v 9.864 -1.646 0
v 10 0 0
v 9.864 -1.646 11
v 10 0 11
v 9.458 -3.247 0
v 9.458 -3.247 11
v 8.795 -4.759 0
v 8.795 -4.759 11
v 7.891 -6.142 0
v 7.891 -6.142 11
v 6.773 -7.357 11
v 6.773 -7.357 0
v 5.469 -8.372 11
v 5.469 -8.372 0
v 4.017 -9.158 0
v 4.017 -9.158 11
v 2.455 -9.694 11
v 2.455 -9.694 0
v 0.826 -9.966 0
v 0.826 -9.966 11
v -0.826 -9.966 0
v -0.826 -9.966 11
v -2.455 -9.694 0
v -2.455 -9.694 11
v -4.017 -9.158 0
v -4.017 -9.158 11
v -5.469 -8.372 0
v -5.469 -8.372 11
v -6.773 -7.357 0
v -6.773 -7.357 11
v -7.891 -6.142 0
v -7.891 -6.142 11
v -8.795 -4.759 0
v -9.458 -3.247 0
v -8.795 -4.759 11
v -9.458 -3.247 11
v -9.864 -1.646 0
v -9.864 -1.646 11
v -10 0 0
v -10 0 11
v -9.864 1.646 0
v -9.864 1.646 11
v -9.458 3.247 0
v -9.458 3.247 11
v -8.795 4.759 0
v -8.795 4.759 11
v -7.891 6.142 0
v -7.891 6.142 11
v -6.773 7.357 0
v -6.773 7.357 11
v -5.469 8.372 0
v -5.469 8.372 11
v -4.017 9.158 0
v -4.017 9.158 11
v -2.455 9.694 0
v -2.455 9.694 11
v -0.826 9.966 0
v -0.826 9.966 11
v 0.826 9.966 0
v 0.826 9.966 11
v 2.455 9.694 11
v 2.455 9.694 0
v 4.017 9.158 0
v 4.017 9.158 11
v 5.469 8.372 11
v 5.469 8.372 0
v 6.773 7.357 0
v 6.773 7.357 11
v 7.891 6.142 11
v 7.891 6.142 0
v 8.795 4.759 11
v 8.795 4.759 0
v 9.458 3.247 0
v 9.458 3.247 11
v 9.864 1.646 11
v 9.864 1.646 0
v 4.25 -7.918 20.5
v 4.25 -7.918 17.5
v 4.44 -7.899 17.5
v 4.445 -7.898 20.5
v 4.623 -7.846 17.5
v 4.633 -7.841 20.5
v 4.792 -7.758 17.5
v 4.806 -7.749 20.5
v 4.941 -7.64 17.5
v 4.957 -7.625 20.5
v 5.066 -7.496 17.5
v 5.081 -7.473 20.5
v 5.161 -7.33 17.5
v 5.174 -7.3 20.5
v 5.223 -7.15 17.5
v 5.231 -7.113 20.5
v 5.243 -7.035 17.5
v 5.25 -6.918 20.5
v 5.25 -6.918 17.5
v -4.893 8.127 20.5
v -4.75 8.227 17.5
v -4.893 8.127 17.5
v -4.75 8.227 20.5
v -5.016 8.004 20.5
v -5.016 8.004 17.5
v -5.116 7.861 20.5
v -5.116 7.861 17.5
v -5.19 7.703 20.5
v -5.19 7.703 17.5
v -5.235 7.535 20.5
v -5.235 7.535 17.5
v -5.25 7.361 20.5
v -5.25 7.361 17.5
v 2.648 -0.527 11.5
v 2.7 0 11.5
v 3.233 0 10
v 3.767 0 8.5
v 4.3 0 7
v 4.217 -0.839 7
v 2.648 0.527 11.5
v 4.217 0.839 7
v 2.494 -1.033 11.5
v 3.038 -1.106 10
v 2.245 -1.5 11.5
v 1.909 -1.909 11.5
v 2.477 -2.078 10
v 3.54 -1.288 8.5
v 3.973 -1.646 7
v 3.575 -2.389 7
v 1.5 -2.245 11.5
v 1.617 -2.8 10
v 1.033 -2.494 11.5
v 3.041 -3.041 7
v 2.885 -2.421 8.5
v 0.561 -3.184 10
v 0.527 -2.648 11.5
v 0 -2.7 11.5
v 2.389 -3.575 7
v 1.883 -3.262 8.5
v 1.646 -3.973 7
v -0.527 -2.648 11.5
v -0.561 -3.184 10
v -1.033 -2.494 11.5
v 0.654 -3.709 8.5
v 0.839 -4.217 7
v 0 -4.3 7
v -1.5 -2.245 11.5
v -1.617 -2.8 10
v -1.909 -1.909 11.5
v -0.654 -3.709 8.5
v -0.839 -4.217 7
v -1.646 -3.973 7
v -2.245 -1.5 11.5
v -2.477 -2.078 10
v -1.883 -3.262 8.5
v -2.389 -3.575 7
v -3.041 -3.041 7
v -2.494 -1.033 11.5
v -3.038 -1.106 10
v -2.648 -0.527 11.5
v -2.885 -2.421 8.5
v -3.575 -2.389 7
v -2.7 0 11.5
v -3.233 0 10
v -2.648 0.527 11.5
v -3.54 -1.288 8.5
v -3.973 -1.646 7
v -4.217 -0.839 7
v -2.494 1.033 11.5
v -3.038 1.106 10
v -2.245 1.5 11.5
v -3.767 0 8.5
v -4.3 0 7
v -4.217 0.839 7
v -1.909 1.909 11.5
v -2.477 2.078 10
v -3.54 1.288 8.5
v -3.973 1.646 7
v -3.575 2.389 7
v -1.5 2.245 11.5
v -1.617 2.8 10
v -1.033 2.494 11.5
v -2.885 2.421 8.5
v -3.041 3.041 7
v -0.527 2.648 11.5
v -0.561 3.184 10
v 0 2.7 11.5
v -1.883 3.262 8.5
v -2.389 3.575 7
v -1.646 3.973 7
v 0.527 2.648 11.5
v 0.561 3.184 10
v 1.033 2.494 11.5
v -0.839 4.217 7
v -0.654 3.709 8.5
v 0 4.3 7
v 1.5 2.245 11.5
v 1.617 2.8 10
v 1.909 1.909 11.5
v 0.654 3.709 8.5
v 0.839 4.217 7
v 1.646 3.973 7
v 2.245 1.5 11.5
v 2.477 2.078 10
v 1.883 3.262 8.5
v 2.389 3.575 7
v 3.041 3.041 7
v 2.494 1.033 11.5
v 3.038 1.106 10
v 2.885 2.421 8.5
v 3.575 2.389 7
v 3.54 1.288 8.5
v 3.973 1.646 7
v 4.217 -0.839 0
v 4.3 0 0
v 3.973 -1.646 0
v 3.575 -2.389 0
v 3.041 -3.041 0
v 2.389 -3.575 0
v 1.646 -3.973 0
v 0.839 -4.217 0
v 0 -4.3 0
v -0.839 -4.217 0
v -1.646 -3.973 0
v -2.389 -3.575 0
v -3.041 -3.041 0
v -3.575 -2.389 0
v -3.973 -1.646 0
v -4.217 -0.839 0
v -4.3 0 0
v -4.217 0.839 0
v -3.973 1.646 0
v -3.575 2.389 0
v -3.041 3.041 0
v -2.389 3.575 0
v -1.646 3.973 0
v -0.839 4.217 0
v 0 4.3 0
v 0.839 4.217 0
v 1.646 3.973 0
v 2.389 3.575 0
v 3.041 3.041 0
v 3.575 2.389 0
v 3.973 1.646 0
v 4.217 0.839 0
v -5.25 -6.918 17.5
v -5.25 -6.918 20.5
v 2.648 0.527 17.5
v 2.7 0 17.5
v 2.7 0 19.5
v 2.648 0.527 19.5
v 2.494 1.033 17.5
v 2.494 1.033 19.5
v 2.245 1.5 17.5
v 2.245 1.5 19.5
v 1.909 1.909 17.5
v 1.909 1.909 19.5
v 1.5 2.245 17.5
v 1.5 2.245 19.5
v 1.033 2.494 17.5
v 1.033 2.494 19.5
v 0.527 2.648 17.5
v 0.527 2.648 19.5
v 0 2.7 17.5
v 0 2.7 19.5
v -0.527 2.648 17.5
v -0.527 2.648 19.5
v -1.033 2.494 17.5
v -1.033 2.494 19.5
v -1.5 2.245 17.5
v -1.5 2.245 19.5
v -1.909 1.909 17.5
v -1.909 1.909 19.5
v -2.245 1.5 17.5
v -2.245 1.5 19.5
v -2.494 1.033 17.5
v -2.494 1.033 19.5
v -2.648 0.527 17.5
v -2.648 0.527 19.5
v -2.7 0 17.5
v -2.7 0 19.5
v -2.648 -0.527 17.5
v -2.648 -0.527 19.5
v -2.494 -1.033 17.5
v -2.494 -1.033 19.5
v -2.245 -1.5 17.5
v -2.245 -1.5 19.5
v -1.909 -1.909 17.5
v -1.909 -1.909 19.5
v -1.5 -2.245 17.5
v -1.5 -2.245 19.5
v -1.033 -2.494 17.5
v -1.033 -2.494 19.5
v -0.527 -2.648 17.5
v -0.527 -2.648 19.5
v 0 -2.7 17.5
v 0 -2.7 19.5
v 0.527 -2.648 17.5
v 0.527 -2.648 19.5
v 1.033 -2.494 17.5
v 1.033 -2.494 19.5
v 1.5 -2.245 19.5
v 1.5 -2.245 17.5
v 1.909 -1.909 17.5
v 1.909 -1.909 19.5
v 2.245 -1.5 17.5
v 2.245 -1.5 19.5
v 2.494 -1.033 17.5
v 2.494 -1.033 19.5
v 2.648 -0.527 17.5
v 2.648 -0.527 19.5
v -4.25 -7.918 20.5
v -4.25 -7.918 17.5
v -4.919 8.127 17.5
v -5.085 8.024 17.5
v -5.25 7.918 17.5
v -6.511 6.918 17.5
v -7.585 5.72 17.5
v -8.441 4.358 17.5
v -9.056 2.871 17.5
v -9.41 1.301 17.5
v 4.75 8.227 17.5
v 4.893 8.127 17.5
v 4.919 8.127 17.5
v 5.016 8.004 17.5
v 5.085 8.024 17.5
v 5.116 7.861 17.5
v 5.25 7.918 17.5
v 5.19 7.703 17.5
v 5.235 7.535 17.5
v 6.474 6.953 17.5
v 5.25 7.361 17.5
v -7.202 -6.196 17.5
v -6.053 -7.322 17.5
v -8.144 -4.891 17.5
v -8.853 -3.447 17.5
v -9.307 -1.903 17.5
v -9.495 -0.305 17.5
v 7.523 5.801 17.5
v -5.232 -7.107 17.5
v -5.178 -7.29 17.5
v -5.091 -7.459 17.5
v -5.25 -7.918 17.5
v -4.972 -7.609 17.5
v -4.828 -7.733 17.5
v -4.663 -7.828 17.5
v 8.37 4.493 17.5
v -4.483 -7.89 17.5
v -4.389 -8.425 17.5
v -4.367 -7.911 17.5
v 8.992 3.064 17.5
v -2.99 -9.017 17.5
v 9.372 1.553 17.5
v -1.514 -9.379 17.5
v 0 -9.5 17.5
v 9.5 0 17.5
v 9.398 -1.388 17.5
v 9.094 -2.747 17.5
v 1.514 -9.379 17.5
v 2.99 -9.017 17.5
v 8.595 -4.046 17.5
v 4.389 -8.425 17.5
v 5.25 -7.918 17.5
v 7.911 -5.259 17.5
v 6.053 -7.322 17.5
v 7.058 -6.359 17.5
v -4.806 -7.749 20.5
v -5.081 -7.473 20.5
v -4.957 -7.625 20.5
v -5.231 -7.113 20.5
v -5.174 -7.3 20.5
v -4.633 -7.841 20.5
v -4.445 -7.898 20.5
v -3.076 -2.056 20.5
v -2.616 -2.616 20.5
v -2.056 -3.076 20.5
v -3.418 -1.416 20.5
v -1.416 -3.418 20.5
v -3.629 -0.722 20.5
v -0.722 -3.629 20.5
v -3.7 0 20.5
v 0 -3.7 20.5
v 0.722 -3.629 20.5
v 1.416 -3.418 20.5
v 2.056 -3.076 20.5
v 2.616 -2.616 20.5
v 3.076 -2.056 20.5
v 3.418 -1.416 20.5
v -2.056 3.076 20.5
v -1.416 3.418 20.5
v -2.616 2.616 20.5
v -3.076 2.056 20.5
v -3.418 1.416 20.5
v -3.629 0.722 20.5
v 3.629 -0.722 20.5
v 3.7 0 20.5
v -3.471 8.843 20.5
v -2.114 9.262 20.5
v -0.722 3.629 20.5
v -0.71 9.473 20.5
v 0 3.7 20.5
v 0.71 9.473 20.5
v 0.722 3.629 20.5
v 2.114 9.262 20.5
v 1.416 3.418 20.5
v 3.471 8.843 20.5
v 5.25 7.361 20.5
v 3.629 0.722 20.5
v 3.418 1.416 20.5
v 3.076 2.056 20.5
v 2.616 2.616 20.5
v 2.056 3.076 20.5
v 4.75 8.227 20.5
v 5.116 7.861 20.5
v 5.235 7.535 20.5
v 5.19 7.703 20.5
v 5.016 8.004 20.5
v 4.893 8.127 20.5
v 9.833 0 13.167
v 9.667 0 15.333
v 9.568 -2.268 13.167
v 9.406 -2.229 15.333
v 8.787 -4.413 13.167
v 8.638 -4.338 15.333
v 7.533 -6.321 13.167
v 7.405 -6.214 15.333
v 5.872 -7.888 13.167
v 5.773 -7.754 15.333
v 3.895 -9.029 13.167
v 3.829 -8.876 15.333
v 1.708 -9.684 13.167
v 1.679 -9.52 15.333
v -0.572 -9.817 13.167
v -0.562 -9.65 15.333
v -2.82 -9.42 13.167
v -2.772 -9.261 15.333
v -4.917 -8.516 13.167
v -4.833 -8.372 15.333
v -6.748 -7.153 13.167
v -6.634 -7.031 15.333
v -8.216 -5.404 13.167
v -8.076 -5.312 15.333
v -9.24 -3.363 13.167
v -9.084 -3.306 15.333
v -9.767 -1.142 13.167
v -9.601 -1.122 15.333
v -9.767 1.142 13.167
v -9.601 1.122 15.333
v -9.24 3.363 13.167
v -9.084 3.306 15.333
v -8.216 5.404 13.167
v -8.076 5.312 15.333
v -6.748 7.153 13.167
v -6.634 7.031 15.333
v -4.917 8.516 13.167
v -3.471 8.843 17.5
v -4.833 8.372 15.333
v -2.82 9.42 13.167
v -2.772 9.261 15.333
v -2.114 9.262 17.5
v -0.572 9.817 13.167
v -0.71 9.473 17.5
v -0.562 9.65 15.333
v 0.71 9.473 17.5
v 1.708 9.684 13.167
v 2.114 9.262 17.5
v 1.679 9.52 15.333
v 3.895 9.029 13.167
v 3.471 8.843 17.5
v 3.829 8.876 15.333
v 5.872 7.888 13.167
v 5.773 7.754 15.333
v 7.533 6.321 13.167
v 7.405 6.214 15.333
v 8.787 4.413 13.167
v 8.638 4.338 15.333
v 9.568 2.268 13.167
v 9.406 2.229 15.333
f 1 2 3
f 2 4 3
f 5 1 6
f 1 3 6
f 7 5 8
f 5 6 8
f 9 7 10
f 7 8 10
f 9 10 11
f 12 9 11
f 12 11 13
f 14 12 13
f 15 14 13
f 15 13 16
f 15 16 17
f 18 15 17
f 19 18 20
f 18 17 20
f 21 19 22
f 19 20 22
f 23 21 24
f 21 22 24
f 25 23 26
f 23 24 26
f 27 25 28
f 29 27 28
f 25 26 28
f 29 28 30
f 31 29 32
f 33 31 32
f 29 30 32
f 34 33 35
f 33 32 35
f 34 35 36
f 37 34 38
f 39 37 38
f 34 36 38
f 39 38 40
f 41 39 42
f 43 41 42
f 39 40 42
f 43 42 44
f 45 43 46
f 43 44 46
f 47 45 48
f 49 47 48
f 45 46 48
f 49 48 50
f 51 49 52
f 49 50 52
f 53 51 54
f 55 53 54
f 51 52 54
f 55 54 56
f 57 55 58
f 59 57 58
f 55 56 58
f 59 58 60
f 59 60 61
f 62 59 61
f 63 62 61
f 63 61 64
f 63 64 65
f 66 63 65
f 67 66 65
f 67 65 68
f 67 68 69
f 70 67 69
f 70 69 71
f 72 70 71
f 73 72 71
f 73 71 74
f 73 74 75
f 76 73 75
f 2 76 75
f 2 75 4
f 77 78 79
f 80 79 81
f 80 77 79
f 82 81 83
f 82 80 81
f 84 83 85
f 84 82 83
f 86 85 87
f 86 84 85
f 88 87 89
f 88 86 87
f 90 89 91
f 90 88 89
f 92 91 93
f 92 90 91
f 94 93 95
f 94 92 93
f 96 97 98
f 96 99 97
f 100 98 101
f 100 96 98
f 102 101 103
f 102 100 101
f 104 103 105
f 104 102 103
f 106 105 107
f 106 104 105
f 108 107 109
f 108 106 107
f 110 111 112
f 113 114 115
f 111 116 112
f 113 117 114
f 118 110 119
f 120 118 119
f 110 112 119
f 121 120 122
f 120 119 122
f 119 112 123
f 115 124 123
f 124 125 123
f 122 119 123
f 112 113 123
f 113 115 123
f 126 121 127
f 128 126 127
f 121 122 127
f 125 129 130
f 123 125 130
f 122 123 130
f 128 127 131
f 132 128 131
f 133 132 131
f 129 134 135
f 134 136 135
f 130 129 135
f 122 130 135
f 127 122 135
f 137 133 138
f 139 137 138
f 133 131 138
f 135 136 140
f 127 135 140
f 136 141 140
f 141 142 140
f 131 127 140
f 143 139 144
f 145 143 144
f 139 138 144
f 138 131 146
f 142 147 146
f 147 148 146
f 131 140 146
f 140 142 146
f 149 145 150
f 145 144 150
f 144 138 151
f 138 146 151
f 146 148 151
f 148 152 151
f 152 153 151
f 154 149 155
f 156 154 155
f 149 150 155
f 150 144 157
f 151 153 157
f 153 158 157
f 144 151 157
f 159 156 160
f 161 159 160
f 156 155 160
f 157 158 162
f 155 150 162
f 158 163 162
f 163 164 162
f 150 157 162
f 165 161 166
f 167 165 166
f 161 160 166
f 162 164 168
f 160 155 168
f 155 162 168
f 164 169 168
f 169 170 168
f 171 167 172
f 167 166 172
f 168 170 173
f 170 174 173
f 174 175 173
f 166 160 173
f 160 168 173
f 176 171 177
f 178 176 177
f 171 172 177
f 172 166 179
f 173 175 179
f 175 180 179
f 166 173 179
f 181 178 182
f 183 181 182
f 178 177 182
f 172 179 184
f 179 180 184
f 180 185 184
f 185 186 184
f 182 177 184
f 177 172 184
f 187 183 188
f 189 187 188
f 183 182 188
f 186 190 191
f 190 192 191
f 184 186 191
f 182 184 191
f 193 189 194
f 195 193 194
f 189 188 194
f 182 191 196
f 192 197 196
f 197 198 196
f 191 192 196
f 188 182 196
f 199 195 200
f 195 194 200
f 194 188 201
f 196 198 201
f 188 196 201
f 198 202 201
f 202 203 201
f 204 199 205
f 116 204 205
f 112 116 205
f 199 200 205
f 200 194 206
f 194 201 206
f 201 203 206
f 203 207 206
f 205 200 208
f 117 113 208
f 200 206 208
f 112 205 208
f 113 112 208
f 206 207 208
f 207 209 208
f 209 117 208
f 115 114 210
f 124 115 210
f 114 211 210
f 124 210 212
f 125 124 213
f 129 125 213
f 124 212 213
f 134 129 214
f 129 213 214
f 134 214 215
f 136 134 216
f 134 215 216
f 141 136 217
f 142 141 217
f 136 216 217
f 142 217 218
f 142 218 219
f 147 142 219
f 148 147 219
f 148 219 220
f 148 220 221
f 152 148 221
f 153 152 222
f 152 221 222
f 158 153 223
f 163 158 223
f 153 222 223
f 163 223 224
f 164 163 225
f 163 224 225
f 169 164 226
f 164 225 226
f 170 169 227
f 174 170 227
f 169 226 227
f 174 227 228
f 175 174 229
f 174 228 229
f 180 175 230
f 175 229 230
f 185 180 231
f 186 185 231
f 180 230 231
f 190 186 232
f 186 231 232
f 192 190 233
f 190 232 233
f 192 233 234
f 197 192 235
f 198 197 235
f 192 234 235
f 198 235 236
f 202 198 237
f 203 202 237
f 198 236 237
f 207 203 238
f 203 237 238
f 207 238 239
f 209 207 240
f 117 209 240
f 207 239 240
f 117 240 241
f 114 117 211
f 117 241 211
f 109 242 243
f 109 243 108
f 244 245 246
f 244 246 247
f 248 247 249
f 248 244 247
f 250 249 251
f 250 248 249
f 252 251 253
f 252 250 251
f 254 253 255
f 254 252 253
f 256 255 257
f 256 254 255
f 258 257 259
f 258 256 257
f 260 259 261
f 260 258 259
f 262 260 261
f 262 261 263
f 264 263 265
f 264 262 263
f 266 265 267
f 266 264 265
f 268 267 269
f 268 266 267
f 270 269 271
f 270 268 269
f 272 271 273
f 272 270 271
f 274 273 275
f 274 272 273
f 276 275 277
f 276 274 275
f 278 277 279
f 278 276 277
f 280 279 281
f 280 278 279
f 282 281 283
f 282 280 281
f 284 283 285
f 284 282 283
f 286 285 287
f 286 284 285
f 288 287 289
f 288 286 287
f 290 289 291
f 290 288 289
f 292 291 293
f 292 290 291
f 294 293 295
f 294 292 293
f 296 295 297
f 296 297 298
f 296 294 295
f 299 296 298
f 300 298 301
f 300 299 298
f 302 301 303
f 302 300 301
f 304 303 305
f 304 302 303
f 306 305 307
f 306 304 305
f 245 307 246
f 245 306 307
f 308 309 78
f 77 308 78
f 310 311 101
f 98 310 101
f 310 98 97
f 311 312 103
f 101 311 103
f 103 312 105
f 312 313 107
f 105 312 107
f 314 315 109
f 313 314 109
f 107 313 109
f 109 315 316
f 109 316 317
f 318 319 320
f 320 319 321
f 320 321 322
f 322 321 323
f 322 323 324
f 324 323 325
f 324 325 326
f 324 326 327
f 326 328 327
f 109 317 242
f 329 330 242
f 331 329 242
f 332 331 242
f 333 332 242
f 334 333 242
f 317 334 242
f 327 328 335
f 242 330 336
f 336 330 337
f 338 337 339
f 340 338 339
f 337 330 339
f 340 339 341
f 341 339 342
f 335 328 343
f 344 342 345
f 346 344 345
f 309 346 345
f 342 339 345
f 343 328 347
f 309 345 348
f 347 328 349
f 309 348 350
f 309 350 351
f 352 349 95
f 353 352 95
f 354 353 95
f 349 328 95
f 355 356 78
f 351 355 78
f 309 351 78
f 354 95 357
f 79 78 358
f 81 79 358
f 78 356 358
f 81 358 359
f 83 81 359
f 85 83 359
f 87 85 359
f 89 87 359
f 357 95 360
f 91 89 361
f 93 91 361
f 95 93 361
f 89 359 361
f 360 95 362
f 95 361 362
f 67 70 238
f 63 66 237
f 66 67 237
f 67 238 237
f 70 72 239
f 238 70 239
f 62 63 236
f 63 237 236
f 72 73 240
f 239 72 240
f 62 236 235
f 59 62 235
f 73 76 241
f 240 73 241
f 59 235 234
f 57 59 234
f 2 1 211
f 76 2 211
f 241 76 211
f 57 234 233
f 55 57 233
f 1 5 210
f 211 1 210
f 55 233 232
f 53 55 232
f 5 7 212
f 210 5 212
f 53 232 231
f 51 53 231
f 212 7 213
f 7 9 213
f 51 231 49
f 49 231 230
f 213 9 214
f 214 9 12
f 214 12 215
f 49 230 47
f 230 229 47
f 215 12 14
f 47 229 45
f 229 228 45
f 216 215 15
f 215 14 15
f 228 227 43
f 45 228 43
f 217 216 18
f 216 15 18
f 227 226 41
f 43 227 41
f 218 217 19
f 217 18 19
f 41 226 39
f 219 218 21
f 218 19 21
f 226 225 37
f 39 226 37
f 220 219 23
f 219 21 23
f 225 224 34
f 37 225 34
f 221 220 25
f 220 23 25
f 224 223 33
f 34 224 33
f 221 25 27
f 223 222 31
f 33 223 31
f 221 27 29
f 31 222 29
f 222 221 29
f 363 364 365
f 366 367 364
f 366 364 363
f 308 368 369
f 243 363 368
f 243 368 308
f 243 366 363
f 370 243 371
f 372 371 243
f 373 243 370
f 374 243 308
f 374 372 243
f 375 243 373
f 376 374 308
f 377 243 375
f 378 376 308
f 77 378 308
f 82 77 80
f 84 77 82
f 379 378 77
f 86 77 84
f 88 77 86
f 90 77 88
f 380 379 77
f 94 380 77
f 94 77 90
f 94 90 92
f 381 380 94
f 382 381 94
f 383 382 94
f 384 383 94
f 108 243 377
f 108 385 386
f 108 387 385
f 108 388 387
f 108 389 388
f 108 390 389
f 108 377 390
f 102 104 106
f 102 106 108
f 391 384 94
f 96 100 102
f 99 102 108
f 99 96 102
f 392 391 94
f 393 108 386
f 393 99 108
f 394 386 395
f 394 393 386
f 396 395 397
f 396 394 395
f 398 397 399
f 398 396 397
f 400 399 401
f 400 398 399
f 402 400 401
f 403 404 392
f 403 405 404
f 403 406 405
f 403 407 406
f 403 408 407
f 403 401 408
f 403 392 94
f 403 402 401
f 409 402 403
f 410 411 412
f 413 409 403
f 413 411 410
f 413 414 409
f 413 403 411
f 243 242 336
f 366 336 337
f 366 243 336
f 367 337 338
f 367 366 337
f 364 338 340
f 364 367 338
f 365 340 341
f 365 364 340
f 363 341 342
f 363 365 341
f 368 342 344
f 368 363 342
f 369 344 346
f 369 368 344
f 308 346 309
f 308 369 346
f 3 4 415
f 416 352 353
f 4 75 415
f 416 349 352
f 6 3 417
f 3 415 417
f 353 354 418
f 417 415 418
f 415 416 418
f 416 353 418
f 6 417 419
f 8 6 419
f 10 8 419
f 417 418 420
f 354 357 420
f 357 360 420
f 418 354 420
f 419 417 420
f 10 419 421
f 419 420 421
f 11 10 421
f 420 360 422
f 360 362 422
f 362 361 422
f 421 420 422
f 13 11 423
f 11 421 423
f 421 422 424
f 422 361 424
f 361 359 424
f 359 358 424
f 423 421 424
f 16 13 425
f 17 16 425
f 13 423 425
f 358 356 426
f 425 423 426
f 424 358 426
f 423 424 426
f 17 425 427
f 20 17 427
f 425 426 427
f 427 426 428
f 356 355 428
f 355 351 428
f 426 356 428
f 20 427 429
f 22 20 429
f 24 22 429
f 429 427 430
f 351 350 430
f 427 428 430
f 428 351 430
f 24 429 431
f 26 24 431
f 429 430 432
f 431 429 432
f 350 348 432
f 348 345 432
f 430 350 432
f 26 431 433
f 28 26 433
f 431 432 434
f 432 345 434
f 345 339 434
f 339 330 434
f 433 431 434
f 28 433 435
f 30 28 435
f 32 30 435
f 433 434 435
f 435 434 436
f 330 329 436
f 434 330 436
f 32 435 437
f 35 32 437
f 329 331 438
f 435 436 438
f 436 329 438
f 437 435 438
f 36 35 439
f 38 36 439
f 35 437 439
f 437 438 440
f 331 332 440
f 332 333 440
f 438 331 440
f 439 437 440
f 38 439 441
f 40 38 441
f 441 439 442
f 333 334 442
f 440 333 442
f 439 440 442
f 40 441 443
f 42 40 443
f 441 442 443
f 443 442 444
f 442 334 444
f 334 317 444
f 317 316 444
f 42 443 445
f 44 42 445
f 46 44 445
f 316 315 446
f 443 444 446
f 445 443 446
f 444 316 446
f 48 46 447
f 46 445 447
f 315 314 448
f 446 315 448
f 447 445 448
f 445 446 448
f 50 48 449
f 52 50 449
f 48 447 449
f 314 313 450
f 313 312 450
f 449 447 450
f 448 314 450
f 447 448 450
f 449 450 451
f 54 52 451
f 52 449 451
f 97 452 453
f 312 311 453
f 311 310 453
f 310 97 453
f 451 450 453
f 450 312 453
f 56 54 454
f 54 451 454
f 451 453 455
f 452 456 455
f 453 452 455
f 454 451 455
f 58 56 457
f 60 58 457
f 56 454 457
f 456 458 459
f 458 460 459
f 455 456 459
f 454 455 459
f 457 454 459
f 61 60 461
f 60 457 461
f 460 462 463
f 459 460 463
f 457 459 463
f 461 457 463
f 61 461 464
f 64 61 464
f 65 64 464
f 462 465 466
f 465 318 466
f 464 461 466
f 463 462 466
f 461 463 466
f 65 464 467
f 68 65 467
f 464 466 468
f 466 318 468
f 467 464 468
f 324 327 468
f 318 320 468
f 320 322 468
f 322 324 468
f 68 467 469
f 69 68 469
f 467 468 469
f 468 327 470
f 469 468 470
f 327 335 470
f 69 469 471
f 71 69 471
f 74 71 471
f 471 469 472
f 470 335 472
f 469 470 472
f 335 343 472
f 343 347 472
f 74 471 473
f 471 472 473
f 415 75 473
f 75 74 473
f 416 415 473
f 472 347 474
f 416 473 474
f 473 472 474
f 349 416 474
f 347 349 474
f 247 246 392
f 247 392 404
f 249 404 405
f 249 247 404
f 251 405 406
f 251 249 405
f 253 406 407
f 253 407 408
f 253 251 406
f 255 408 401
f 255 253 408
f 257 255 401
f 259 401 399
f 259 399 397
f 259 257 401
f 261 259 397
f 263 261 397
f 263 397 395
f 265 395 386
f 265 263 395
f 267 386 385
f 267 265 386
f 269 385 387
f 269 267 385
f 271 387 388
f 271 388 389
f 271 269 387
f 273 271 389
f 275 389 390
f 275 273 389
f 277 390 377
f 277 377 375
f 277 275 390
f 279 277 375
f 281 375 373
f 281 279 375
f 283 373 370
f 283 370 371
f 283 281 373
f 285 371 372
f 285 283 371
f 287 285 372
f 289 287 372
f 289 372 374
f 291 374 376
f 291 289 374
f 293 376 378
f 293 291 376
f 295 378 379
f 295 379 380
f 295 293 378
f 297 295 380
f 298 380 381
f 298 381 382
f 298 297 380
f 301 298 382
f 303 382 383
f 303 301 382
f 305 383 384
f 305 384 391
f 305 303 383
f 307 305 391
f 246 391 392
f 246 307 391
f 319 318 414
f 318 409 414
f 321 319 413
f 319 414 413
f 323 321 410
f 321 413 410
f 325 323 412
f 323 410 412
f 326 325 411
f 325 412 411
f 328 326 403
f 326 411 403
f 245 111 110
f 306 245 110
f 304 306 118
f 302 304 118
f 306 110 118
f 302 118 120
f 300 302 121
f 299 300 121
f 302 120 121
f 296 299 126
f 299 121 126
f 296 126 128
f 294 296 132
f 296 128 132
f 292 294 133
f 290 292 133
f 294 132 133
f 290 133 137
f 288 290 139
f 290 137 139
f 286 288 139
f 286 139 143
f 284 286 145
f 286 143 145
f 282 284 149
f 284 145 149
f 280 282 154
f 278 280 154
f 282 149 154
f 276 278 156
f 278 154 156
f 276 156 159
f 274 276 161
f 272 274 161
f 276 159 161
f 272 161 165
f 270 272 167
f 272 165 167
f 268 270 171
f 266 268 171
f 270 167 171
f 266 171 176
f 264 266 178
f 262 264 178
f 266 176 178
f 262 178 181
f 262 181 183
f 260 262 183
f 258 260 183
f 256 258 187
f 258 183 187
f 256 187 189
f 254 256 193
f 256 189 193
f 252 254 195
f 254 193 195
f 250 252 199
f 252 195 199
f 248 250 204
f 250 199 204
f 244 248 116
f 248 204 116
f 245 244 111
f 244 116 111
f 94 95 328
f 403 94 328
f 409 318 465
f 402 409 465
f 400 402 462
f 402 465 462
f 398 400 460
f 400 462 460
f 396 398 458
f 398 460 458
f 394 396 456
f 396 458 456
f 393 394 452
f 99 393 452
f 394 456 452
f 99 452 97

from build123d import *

# Parameters (mm, degrees)
F3_W     = 10.5
F3_H     = 15.8350876221
F3_R     = 2.7
F4_DEPTH = 3
F5_R     = 1
F7_DEPTH = 3
F8_R     = 1
F9_SIZE  = 1


with BuildPart() as f2:
    # F0 (on Front) → F2 (revolve)
    with BuildSketch(Plane.XZ):
        Polygon((4.3, 7), (4.3, 0), (10, 0), (10, 11), (9.5, 17.5), (2.7, 17.5), (2.7, 11.5), align=None)
    revolve(axis=Axis((0, 0, 12.8003526479), (0, 0, -1)))

    # F3 (on face) → F4 (join)
    with BuildSketch(Plane.XY.offset(17.5)):
        Rectangle(F3_W, F3_H)
        Circle(F3_R, mode=Mode.SUBTRACT)
    extrude(amount=F4_DEPTH)

    # F5
    f5_edges = [f2.edges().sort_by_distance(p)[0] for p in [
        (-5.25, -7.917544, 19),
        (5.25, -7.917544, 19),
    ]]
    fillet(f5_edges, radius=F5_R)

    # F6 (on face) → F7 (join)
    with BuildSketch(Plane.XY.offset(17.5)):
        with BuildLine():
            Line((-5.25, 7.9175438111), (5.25, 7.9175438111))
            ThreePointArc((5.25, 7.9175438111), (0, 9.5), (-5.25, 7.9175438111))
        make_face()
    extrude(amount=F7_DEPTH)

    # F8
    f8_edges = [f2.edges().sort_by_distance(p)[0] for p in [
        (5.25, 7.917544, 19),
        (-5.25, 7.917544, 19),
    ]]
    fillet(f8_edges, radius=F8_R)

    # F9
    f9_edges = [f2.edges().sort_by_distance(p)[0] for p in [
        (-2.7, 0, 20.5),
        (2.7, 0, 19),
    ]]
    chamfer(f9_edges, length=F9_SIZE)


solid = f2.part
